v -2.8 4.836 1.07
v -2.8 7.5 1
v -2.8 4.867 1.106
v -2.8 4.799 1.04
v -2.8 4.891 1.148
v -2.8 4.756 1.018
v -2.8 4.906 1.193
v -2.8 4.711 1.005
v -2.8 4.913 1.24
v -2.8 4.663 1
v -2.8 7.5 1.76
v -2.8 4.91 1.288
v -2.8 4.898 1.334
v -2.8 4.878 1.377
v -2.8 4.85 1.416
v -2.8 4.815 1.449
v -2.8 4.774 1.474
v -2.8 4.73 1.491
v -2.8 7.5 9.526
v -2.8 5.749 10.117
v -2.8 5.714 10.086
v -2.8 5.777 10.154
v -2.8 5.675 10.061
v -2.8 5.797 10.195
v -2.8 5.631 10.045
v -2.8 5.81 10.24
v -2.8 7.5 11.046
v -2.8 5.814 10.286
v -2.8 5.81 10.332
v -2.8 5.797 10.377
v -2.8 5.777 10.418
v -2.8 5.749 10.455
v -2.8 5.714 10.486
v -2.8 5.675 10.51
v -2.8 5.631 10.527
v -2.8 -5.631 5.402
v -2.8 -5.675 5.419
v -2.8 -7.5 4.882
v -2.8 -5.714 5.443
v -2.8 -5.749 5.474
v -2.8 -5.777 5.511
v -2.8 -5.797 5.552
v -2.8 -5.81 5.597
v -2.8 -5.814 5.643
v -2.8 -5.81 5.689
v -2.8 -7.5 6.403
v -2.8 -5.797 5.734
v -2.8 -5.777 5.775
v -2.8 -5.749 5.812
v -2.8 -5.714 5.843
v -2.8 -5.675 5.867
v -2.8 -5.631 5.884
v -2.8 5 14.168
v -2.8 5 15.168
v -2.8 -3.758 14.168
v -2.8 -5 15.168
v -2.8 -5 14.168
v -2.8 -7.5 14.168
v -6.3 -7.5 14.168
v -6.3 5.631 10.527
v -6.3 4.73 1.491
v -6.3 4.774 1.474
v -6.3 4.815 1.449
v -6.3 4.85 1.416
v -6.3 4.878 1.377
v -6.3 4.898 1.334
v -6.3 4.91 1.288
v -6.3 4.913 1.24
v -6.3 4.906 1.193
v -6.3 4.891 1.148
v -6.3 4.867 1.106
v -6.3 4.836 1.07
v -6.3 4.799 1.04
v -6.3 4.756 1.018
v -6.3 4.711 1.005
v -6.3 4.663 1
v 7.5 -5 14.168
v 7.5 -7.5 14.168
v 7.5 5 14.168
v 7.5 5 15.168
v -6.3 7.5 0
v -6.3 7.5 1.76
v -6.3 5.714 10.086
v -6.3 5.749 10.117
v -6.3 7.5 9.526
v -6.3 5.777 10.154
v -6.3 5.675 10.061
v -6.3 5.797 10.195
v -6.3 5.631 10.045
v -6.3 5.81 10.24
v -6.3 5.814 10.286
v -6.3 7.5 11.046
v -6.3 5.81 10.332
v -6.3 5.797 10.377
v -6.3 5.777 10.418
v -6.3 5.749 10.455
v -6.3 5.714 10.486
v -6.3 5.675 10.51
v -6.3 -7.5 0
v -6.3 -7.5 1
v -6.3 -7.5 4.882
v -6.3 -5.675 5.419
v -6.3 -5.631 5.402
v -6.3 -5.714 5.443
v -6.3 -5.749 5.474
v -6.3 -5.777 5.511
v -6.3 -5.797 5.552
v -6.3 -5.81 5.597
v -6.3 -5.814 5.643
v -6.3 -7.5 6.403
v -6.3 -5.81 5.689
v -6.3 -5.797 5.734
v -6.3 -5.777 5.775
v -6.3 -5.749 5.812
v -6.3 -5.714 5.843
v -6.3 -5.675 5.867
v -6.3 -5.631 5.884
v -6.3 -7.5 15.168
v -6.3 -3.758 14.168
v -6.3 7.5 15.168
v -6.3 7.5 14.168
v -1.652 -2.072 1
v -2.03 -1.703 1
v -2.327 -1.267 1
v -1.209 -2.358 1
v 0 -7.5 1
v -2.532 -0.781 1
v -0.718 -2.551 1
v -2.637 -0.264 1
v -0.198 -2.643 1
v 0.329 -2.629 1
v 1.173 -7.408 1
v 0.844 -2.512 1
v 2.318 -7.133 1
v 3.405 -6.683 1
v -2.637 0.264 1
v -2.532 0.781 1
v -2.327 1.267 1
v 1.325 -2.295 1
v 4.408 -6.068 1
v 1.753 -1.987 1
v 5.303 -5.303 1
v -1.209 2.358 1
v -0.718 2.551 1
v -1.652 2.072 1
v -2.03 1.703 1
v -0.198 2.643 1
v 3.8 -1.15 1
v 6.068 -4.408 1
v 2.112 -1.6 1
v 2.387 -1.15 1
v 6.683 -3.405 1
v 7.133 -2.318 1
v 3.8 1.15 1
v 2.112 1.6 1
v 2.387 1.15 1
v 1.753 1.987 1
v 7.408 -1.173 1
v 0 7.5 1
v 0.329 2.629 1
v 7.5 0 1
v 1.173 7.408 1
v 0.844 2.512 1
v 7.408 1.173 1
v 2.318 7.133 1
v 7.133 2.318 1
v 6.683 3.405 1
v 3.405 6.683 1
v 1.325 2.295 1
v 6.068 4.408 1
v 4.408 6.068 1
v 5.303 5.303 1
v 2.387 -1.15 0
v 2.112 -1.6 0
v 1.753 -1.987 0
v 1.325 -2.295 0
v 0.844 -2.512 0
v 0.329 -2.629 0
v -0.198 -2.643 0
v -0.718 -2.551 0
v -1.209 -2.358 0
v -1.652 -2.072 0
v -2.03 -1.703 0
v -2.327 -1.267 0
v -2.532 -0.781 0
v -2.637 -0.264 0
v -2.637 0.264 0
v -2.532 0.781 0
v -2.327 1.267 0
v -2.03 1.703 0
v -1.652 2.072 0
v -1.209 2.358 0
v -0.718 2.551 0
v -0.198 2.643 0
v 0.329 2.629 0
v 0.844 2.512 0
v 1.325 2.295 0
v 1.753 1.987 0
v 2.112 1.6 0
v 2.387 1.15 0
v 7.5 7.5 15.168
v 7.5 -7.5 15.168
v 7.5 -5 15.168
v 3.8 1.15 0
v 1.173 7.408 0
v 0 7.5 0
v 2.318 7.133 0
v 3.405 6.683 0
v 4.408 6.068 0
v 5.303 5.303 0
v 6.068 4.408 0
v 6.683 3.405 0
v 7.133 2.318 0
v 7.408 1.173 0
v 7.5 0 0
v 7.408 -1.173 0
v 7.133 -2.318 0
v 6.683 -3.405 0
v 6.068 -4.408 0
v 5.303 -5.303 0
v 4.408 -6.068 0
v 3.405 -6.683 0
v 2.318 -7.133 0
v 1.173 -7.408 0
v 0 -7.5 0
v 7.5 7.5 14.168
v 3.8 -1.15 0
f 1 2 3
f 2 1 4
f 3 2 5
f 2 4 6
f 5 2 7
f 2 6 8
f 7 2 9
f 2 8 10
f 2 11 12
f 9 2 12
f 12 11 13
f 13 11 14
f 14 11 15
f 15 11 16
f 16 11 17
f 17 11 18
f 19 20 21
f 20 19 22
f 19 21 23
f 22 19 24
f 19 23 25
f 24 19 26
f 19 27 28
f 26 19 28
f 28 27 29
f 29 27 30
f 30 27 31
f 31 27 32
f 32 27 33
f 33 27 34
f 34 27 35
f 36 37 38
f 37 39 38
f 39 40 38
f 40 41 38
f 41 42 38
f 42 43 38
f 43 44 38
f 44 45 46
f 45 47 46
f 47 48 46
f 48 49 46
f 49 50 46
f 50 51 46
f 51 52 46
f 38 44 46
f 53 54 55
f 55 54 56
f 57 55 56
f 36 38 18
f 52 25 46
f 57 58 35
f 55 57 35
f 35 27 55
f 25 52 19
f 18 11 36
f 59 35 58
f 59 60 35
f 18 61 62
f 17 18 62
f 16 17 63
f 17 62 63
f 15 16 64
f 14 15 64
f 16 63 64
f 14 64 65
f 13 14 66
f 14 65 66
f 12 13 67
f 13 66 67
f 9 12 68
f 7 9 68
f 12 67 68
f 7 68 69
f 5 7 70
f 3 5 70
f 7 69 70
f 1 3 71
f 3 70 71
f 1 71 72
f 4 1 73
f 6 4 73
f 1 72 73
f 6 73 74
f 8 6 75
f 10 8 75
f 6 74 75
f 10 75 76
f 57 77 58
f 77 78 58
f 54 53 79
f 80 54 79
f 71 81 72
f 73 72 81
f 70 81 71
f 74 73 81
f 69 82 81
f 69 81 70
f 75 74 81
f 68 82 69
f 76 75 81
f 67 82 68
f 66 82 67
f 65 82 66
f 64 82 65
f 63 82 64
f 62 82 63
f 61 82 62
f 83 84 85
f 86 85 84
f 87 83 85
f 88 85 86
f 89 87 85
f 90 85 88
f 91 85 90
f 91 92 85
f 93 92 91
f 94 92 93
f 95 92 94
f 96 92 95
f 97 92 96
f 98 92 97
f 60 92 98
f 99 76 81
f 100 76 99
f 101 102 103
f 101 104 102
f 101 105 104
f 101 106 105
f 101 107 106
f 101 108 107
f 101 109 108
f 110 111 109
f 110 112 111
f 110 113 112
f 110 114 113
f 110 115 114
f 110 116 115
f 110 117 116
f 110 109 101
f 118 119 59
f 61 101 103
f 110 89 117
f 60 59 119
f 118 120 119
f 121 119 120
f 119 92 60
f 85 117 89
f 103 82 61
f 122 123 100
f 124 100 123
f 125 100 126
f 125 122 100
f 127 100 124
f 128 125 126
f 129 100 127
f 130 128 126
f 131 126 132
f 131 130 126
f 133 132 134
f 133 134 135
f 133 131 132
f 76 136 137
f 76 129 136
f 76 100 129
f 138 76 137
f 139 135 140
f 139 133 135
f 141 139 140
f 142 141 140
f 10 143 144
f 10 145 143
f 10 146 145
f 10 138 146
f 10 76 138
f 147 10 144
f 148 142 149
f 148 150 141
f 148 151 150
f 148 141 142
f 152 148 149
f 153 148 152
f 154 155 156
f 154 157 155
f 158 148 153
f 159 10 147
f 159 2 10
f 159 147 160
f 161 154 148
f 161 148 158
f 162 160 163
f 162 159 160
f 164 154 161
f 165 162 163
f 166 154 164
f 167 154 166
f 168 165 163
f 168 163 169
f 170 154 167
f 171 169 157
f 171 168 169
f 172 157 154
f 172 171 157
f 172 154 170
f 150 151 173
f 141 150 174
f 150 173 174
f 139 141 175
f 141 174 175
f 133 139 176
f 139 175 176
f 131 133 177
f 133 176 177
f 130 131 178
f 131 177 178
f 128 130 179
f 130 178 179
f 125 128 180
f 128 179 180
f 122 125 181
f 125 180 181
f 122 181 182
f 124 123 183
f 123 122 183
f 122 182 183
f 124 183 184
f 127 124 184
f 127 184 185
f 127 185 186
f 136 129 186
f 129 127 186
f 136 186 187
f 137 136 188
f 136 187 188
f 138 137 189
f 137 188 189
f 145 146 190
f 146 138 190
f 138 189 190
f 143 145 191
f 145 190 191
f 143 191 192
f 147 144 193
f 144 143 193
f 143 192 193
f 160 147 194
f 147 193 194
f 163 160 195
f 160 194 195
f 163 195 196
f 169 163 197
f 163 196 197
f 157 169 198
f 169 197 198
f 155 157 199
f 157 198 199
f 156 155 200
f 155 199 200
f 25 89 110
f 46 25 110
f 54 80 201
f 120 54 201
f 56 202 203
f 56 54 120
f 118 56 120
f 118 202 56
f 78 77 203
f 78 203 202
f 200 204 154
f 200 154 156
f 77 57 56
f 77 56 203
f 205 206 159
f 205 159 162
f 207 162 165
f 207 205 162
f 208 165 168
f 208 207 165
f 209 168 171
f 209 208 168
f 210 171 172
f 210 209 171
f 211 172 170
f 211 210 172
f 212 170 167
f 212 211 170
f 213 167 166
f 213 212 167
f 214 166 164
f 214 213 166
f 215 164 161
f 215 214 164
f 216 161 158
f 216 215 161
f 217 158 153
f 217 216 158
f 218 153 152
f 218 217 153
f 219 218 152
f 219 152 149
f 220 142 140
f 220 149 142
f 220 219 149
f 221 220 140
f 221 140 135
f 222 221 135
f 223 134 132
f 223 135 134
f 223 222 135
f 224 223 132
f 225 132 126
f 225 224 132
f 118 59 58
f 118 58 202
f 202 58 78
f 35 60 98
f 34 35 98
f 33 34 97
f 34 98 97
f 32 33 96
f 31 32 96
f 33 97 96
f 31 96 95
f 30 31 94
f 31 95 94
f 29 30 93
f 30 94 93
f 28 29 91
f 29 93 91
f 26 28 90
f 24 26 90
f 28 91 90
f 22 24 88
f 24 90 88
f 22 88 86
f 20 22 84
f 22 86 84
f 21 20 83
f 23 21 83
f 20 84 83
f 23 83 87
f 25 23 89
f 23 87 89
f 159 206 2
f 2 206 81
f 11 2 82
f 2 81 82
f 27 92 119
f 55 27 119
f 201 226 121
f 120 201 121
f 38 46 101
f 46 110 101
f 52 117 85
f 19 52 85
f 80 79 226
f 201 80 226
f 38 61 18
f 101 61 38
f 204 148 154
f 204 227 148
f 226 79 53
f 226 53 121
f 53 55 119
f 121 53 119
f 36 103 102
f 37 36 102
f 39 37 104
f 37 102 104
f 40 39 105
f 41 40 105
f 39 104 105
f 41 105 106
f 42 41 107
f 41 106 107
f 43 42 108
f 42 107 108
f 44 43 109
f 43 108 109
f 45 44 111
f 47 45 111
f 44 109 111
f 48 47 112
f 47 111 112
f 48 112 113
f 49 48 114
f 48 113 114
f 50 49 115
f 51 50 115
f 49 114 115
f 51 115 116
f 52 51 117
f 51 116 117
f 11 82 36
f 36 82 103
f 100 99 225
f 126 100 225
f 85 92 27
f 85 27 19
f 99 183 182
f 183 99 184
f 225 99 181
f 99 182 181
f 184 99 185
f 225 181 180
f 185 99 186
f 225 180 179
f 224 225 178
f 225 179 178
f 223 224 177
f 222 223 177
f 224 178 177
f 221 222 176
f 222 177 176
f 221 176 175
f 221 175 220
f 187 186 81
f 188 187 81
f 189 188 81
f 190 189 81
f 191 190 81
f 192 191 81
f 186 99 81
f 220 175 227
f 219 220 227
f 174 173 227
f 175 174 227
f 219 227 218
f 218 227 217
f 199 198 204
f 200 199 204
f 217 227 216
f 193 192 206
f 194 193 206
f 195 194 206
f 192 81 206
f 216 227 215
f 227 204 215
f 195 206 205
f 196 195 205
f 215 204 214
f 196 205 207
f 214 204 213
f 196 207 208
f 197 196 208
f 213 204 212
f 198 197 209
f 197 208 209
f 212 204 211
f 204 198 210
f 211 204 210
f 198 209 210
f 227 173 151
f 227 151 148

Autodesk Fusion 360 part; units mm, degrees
sketch "スケッチ1" plane through (0, 0, 0) normal (0, 0, 1) x (1, 0, 0)
  circle A0 centre (0, 0) radius 2.65
  line L0 (0, -7.5) -> (0, 7.5)
  line L1 (0, 7.5) -> (-6.3, 7.5)
  line L2 (-6.3, 7.5) -> (-6.3, -7.5)
  line L3 (-6.3, -7.5) -> (0, -7.5)
  line L4 (0, -7.5) -> (0, 7.5)
  arc A1 (0, -7.5) -> (0, 7.5) centre (0, 0) ccw
  line L5 (2.65, 0) -> (-2.65, 0)
  line L6 (3.8, 1.15) -> (1.5, 1.15)
  line L7 (1.5, 1.15) -> (1.5, -1.15)
  line L8 (1.5, -1.15) -> (3.8, -1.15)
  line L9 (3.8, -1.15) -> (3.8, 1.15)
  line L10 (3.8, 1.15) -> (1.5, -1.15) construction
  line L11 (1.5, 1.15) -> (3.8, -1.15) construction
  point P0 (2.65, 0)
  dimension "d1" = 5.3
  dimension "d2" = 15
  dimension "d5" = 6.3
  dimension "d6" = 15
  dimension "d31" = 2.3
  dimension "d32" = 2.3
extrude "押し出し1" add sketch "スケッチ1" along normal blind 1 contours A0 L0 L4 A1 L6 L8 L9 | A0 L0 L1 L2 L3 L4
sketch "スケッチ2" plane through (-6.3, 0, 0) normal (-1, 0, 0) x (0, -1, 0)
  line L0 (-7.5, 0) -> (7.5, 0)
  line L1 (7.5, 0) -> (7.5, 1)
  line L2 (7.5, 1) -> (-7.5, 1)
  line L3 (-7.5, 1) -> (-7.5, 0)
  line L4 (-7.5, 1) -> (-7.5, 16) construction
  line L5 (7.5, 1) -> (7.5, 16) construction
  line L6 (-7.5, 1) -> (-7.5, 1.7604)
  line L7 (-6.5, 1) -> (-7.5, 1)
  line L8 (-7.5, 1) -> (-7.5, 1.7604)
  line L9 (-4.7298, 1.4909) -> (7.5, 4.8825)
  line L10 (-4.663, 1) -> (10.2045, 1) construction
  line L11 (-7.5, 1.7604) -> (5.6313, 5.4021)
  line L12 (5.6313, 5.8839) -> (-7.5, 9.5255)
  line L13 (-5.6313, 10.045) -> (7.5, 6.4034)
  line L14 (7.5, 6.4034) -> (7.5, 4.8825)
  line L15 (-5.6313, 10.5268) -> (7.5, 14.1685)
  line L16 (-7.5, 11.0463) -> (3.758, 14.1685)
  line L17 (-7.5, 11.0463) -> (-7.5, 9.5255)
  line L18 (7.5, 14.1685) -> (3.758, 14.1685)
  arc A0 (-4.7298, 1.4909) -> (-4.663, 1) centre (-4.663, 1.25) ccw
  arc A1 (5.6313, 5.4021) -> (5.6313, 5.8839) centre (5.5645, 5.643) ccw
  arc A2 (-5.6313, 10.5268) -> (-5.6313, 10.045) centre (-5.5645, 10.2859) ccw
  point P0 (6.5, 5.643)
  point P1 (-6.5, 10.2859)
  dimension "d7" = 15
  dimension "d8" = 15
  dimension "d9" = 15.5
  dimension "d15" = 15.5
  dimension "d16" = 1
  dimension "d17" = 1
  dimension "d18" = 15.5
  dimension "d19" = 15.5
  dimension "d20" = 1
  dimension "d21" = 1
  dimension "d22" = 15.5
  dimension "d23" = 15.5
  dimension "d24" = 1
  dimension "d25" = 1
  dimension "d26" = 0.25
  dimension "d27" = 0.25
  dimension "d28" = 0.25
extrude "押し出し2" add sketch "スケッチ2" against normal blind 3.5 contours L2 L6 L7 L8 L9 L11 L12 L13 L14 L15 L16 L17 L18 A0 A1 A2
sketch "スケッチ3" plane through (0, 0, 14.1685) normal (0, 0, 1) x (-1, 0, 0)
  line L0 (6.3, 3.758) -> (6.3, 7.5)
  line L1 (6.3, 7.5) -> (2.8, 7.5)
  line L2 (2.8, 7.5) -> (2.8, 3.758)
  line L3 (2.8, 3.758) -> (6.3, 3.758)
  line L4 (2.8, -4.663) -> (6.3, -4.663)
  line L5 (6.3, -4.663) -> (6.3, 7.5)
  line L6 (6.3, 7.5) -> (0, 7.5)
  arc A0 (0, 7.5) -> (0, -7.5) centre (0, 0) ccw
  line L7 (0, -7.5) -> (2.8, -7.5)
  line L8 (2.8, -7.5) -> (2.8, -4.663)
  line L9 (-3.8, -1.15) -> (-3.8, 1.15)
  line L10 (-3.8, 1.15) -> (-2.3875, 1.15)
  arc A1 (-2.3875, -1.15) -> (-2.3875, 1.15) centre (0, 0) ccw
  line L11 (-2.3875, -1.15) -> (-3.8, -1.15)
  line L12 (6.3, -7.5) -> (6.3, 3.758)
  line L13 (6.3, 3.758) -> (2.8, 3.758)
  line L14 (2.8, 3.758) -> (2.8, -7.5)
  line L15 (2.8, -7.5) -> (6.3, -7.5)
  line L16 (6.3, 5) -> (6.3, -5)
  line L17 (-7.5, 0) -> (-7.5, -7.5)
  line L18 (-7.5, -7.5) -> (6.3, -7.5)
  line L19 (6.3, -4.663) -> (6.3, -7.5)
  line L20 (6.3, -5) -> (-7.5, -5)
  line L21 (-20, 0) -> (-2.5, 0)
  line L22 (6.3, 5) -> (-7.5, 5)
  line L23 (-7.5, 0) -> (-7.5, 7.5)
  line L24 (6.3, 4.663) -> (6.3, 7.5)
  line L25 (-7.5, 7.5) -> (6.3, 7.5)
  point P0 (6.3, 0)
  dimension "d38" = 5
extrude "押し出し3" add sketch "スケッチ3" along normal blind 1 contours L0 L2 L3 L5 L13 L16 L22 L24 | L3 L4 L5 L12 L13 L14 L16 | L4 L8 L12 L14 L16 L19 L20 | L0 L1 L2 L5 L6 L22 L24 L25 | L2 L6 A0 L22 L25 | L8 L12 L14 L15 L18 L19 L20 | A0 L22 L23 L25 | A0 L7 L8 L14 L18 L20 | A0 L17 L18 L20
equation "d5 = d1 + 1 mm"
equation "d6 = d2"
equation "d8 = d7"
equation "d15 = d9"
equation "d17 = d16"
equation "d18 = d9"
equation "d19 = d9"
equation "d20 = d16"
equation "d21 = d16"
equation "d22 = d9"
equation "d23 = d9"
equation "d24 = d16"
equation "d25 = d16"
equation "d31 = d32"
